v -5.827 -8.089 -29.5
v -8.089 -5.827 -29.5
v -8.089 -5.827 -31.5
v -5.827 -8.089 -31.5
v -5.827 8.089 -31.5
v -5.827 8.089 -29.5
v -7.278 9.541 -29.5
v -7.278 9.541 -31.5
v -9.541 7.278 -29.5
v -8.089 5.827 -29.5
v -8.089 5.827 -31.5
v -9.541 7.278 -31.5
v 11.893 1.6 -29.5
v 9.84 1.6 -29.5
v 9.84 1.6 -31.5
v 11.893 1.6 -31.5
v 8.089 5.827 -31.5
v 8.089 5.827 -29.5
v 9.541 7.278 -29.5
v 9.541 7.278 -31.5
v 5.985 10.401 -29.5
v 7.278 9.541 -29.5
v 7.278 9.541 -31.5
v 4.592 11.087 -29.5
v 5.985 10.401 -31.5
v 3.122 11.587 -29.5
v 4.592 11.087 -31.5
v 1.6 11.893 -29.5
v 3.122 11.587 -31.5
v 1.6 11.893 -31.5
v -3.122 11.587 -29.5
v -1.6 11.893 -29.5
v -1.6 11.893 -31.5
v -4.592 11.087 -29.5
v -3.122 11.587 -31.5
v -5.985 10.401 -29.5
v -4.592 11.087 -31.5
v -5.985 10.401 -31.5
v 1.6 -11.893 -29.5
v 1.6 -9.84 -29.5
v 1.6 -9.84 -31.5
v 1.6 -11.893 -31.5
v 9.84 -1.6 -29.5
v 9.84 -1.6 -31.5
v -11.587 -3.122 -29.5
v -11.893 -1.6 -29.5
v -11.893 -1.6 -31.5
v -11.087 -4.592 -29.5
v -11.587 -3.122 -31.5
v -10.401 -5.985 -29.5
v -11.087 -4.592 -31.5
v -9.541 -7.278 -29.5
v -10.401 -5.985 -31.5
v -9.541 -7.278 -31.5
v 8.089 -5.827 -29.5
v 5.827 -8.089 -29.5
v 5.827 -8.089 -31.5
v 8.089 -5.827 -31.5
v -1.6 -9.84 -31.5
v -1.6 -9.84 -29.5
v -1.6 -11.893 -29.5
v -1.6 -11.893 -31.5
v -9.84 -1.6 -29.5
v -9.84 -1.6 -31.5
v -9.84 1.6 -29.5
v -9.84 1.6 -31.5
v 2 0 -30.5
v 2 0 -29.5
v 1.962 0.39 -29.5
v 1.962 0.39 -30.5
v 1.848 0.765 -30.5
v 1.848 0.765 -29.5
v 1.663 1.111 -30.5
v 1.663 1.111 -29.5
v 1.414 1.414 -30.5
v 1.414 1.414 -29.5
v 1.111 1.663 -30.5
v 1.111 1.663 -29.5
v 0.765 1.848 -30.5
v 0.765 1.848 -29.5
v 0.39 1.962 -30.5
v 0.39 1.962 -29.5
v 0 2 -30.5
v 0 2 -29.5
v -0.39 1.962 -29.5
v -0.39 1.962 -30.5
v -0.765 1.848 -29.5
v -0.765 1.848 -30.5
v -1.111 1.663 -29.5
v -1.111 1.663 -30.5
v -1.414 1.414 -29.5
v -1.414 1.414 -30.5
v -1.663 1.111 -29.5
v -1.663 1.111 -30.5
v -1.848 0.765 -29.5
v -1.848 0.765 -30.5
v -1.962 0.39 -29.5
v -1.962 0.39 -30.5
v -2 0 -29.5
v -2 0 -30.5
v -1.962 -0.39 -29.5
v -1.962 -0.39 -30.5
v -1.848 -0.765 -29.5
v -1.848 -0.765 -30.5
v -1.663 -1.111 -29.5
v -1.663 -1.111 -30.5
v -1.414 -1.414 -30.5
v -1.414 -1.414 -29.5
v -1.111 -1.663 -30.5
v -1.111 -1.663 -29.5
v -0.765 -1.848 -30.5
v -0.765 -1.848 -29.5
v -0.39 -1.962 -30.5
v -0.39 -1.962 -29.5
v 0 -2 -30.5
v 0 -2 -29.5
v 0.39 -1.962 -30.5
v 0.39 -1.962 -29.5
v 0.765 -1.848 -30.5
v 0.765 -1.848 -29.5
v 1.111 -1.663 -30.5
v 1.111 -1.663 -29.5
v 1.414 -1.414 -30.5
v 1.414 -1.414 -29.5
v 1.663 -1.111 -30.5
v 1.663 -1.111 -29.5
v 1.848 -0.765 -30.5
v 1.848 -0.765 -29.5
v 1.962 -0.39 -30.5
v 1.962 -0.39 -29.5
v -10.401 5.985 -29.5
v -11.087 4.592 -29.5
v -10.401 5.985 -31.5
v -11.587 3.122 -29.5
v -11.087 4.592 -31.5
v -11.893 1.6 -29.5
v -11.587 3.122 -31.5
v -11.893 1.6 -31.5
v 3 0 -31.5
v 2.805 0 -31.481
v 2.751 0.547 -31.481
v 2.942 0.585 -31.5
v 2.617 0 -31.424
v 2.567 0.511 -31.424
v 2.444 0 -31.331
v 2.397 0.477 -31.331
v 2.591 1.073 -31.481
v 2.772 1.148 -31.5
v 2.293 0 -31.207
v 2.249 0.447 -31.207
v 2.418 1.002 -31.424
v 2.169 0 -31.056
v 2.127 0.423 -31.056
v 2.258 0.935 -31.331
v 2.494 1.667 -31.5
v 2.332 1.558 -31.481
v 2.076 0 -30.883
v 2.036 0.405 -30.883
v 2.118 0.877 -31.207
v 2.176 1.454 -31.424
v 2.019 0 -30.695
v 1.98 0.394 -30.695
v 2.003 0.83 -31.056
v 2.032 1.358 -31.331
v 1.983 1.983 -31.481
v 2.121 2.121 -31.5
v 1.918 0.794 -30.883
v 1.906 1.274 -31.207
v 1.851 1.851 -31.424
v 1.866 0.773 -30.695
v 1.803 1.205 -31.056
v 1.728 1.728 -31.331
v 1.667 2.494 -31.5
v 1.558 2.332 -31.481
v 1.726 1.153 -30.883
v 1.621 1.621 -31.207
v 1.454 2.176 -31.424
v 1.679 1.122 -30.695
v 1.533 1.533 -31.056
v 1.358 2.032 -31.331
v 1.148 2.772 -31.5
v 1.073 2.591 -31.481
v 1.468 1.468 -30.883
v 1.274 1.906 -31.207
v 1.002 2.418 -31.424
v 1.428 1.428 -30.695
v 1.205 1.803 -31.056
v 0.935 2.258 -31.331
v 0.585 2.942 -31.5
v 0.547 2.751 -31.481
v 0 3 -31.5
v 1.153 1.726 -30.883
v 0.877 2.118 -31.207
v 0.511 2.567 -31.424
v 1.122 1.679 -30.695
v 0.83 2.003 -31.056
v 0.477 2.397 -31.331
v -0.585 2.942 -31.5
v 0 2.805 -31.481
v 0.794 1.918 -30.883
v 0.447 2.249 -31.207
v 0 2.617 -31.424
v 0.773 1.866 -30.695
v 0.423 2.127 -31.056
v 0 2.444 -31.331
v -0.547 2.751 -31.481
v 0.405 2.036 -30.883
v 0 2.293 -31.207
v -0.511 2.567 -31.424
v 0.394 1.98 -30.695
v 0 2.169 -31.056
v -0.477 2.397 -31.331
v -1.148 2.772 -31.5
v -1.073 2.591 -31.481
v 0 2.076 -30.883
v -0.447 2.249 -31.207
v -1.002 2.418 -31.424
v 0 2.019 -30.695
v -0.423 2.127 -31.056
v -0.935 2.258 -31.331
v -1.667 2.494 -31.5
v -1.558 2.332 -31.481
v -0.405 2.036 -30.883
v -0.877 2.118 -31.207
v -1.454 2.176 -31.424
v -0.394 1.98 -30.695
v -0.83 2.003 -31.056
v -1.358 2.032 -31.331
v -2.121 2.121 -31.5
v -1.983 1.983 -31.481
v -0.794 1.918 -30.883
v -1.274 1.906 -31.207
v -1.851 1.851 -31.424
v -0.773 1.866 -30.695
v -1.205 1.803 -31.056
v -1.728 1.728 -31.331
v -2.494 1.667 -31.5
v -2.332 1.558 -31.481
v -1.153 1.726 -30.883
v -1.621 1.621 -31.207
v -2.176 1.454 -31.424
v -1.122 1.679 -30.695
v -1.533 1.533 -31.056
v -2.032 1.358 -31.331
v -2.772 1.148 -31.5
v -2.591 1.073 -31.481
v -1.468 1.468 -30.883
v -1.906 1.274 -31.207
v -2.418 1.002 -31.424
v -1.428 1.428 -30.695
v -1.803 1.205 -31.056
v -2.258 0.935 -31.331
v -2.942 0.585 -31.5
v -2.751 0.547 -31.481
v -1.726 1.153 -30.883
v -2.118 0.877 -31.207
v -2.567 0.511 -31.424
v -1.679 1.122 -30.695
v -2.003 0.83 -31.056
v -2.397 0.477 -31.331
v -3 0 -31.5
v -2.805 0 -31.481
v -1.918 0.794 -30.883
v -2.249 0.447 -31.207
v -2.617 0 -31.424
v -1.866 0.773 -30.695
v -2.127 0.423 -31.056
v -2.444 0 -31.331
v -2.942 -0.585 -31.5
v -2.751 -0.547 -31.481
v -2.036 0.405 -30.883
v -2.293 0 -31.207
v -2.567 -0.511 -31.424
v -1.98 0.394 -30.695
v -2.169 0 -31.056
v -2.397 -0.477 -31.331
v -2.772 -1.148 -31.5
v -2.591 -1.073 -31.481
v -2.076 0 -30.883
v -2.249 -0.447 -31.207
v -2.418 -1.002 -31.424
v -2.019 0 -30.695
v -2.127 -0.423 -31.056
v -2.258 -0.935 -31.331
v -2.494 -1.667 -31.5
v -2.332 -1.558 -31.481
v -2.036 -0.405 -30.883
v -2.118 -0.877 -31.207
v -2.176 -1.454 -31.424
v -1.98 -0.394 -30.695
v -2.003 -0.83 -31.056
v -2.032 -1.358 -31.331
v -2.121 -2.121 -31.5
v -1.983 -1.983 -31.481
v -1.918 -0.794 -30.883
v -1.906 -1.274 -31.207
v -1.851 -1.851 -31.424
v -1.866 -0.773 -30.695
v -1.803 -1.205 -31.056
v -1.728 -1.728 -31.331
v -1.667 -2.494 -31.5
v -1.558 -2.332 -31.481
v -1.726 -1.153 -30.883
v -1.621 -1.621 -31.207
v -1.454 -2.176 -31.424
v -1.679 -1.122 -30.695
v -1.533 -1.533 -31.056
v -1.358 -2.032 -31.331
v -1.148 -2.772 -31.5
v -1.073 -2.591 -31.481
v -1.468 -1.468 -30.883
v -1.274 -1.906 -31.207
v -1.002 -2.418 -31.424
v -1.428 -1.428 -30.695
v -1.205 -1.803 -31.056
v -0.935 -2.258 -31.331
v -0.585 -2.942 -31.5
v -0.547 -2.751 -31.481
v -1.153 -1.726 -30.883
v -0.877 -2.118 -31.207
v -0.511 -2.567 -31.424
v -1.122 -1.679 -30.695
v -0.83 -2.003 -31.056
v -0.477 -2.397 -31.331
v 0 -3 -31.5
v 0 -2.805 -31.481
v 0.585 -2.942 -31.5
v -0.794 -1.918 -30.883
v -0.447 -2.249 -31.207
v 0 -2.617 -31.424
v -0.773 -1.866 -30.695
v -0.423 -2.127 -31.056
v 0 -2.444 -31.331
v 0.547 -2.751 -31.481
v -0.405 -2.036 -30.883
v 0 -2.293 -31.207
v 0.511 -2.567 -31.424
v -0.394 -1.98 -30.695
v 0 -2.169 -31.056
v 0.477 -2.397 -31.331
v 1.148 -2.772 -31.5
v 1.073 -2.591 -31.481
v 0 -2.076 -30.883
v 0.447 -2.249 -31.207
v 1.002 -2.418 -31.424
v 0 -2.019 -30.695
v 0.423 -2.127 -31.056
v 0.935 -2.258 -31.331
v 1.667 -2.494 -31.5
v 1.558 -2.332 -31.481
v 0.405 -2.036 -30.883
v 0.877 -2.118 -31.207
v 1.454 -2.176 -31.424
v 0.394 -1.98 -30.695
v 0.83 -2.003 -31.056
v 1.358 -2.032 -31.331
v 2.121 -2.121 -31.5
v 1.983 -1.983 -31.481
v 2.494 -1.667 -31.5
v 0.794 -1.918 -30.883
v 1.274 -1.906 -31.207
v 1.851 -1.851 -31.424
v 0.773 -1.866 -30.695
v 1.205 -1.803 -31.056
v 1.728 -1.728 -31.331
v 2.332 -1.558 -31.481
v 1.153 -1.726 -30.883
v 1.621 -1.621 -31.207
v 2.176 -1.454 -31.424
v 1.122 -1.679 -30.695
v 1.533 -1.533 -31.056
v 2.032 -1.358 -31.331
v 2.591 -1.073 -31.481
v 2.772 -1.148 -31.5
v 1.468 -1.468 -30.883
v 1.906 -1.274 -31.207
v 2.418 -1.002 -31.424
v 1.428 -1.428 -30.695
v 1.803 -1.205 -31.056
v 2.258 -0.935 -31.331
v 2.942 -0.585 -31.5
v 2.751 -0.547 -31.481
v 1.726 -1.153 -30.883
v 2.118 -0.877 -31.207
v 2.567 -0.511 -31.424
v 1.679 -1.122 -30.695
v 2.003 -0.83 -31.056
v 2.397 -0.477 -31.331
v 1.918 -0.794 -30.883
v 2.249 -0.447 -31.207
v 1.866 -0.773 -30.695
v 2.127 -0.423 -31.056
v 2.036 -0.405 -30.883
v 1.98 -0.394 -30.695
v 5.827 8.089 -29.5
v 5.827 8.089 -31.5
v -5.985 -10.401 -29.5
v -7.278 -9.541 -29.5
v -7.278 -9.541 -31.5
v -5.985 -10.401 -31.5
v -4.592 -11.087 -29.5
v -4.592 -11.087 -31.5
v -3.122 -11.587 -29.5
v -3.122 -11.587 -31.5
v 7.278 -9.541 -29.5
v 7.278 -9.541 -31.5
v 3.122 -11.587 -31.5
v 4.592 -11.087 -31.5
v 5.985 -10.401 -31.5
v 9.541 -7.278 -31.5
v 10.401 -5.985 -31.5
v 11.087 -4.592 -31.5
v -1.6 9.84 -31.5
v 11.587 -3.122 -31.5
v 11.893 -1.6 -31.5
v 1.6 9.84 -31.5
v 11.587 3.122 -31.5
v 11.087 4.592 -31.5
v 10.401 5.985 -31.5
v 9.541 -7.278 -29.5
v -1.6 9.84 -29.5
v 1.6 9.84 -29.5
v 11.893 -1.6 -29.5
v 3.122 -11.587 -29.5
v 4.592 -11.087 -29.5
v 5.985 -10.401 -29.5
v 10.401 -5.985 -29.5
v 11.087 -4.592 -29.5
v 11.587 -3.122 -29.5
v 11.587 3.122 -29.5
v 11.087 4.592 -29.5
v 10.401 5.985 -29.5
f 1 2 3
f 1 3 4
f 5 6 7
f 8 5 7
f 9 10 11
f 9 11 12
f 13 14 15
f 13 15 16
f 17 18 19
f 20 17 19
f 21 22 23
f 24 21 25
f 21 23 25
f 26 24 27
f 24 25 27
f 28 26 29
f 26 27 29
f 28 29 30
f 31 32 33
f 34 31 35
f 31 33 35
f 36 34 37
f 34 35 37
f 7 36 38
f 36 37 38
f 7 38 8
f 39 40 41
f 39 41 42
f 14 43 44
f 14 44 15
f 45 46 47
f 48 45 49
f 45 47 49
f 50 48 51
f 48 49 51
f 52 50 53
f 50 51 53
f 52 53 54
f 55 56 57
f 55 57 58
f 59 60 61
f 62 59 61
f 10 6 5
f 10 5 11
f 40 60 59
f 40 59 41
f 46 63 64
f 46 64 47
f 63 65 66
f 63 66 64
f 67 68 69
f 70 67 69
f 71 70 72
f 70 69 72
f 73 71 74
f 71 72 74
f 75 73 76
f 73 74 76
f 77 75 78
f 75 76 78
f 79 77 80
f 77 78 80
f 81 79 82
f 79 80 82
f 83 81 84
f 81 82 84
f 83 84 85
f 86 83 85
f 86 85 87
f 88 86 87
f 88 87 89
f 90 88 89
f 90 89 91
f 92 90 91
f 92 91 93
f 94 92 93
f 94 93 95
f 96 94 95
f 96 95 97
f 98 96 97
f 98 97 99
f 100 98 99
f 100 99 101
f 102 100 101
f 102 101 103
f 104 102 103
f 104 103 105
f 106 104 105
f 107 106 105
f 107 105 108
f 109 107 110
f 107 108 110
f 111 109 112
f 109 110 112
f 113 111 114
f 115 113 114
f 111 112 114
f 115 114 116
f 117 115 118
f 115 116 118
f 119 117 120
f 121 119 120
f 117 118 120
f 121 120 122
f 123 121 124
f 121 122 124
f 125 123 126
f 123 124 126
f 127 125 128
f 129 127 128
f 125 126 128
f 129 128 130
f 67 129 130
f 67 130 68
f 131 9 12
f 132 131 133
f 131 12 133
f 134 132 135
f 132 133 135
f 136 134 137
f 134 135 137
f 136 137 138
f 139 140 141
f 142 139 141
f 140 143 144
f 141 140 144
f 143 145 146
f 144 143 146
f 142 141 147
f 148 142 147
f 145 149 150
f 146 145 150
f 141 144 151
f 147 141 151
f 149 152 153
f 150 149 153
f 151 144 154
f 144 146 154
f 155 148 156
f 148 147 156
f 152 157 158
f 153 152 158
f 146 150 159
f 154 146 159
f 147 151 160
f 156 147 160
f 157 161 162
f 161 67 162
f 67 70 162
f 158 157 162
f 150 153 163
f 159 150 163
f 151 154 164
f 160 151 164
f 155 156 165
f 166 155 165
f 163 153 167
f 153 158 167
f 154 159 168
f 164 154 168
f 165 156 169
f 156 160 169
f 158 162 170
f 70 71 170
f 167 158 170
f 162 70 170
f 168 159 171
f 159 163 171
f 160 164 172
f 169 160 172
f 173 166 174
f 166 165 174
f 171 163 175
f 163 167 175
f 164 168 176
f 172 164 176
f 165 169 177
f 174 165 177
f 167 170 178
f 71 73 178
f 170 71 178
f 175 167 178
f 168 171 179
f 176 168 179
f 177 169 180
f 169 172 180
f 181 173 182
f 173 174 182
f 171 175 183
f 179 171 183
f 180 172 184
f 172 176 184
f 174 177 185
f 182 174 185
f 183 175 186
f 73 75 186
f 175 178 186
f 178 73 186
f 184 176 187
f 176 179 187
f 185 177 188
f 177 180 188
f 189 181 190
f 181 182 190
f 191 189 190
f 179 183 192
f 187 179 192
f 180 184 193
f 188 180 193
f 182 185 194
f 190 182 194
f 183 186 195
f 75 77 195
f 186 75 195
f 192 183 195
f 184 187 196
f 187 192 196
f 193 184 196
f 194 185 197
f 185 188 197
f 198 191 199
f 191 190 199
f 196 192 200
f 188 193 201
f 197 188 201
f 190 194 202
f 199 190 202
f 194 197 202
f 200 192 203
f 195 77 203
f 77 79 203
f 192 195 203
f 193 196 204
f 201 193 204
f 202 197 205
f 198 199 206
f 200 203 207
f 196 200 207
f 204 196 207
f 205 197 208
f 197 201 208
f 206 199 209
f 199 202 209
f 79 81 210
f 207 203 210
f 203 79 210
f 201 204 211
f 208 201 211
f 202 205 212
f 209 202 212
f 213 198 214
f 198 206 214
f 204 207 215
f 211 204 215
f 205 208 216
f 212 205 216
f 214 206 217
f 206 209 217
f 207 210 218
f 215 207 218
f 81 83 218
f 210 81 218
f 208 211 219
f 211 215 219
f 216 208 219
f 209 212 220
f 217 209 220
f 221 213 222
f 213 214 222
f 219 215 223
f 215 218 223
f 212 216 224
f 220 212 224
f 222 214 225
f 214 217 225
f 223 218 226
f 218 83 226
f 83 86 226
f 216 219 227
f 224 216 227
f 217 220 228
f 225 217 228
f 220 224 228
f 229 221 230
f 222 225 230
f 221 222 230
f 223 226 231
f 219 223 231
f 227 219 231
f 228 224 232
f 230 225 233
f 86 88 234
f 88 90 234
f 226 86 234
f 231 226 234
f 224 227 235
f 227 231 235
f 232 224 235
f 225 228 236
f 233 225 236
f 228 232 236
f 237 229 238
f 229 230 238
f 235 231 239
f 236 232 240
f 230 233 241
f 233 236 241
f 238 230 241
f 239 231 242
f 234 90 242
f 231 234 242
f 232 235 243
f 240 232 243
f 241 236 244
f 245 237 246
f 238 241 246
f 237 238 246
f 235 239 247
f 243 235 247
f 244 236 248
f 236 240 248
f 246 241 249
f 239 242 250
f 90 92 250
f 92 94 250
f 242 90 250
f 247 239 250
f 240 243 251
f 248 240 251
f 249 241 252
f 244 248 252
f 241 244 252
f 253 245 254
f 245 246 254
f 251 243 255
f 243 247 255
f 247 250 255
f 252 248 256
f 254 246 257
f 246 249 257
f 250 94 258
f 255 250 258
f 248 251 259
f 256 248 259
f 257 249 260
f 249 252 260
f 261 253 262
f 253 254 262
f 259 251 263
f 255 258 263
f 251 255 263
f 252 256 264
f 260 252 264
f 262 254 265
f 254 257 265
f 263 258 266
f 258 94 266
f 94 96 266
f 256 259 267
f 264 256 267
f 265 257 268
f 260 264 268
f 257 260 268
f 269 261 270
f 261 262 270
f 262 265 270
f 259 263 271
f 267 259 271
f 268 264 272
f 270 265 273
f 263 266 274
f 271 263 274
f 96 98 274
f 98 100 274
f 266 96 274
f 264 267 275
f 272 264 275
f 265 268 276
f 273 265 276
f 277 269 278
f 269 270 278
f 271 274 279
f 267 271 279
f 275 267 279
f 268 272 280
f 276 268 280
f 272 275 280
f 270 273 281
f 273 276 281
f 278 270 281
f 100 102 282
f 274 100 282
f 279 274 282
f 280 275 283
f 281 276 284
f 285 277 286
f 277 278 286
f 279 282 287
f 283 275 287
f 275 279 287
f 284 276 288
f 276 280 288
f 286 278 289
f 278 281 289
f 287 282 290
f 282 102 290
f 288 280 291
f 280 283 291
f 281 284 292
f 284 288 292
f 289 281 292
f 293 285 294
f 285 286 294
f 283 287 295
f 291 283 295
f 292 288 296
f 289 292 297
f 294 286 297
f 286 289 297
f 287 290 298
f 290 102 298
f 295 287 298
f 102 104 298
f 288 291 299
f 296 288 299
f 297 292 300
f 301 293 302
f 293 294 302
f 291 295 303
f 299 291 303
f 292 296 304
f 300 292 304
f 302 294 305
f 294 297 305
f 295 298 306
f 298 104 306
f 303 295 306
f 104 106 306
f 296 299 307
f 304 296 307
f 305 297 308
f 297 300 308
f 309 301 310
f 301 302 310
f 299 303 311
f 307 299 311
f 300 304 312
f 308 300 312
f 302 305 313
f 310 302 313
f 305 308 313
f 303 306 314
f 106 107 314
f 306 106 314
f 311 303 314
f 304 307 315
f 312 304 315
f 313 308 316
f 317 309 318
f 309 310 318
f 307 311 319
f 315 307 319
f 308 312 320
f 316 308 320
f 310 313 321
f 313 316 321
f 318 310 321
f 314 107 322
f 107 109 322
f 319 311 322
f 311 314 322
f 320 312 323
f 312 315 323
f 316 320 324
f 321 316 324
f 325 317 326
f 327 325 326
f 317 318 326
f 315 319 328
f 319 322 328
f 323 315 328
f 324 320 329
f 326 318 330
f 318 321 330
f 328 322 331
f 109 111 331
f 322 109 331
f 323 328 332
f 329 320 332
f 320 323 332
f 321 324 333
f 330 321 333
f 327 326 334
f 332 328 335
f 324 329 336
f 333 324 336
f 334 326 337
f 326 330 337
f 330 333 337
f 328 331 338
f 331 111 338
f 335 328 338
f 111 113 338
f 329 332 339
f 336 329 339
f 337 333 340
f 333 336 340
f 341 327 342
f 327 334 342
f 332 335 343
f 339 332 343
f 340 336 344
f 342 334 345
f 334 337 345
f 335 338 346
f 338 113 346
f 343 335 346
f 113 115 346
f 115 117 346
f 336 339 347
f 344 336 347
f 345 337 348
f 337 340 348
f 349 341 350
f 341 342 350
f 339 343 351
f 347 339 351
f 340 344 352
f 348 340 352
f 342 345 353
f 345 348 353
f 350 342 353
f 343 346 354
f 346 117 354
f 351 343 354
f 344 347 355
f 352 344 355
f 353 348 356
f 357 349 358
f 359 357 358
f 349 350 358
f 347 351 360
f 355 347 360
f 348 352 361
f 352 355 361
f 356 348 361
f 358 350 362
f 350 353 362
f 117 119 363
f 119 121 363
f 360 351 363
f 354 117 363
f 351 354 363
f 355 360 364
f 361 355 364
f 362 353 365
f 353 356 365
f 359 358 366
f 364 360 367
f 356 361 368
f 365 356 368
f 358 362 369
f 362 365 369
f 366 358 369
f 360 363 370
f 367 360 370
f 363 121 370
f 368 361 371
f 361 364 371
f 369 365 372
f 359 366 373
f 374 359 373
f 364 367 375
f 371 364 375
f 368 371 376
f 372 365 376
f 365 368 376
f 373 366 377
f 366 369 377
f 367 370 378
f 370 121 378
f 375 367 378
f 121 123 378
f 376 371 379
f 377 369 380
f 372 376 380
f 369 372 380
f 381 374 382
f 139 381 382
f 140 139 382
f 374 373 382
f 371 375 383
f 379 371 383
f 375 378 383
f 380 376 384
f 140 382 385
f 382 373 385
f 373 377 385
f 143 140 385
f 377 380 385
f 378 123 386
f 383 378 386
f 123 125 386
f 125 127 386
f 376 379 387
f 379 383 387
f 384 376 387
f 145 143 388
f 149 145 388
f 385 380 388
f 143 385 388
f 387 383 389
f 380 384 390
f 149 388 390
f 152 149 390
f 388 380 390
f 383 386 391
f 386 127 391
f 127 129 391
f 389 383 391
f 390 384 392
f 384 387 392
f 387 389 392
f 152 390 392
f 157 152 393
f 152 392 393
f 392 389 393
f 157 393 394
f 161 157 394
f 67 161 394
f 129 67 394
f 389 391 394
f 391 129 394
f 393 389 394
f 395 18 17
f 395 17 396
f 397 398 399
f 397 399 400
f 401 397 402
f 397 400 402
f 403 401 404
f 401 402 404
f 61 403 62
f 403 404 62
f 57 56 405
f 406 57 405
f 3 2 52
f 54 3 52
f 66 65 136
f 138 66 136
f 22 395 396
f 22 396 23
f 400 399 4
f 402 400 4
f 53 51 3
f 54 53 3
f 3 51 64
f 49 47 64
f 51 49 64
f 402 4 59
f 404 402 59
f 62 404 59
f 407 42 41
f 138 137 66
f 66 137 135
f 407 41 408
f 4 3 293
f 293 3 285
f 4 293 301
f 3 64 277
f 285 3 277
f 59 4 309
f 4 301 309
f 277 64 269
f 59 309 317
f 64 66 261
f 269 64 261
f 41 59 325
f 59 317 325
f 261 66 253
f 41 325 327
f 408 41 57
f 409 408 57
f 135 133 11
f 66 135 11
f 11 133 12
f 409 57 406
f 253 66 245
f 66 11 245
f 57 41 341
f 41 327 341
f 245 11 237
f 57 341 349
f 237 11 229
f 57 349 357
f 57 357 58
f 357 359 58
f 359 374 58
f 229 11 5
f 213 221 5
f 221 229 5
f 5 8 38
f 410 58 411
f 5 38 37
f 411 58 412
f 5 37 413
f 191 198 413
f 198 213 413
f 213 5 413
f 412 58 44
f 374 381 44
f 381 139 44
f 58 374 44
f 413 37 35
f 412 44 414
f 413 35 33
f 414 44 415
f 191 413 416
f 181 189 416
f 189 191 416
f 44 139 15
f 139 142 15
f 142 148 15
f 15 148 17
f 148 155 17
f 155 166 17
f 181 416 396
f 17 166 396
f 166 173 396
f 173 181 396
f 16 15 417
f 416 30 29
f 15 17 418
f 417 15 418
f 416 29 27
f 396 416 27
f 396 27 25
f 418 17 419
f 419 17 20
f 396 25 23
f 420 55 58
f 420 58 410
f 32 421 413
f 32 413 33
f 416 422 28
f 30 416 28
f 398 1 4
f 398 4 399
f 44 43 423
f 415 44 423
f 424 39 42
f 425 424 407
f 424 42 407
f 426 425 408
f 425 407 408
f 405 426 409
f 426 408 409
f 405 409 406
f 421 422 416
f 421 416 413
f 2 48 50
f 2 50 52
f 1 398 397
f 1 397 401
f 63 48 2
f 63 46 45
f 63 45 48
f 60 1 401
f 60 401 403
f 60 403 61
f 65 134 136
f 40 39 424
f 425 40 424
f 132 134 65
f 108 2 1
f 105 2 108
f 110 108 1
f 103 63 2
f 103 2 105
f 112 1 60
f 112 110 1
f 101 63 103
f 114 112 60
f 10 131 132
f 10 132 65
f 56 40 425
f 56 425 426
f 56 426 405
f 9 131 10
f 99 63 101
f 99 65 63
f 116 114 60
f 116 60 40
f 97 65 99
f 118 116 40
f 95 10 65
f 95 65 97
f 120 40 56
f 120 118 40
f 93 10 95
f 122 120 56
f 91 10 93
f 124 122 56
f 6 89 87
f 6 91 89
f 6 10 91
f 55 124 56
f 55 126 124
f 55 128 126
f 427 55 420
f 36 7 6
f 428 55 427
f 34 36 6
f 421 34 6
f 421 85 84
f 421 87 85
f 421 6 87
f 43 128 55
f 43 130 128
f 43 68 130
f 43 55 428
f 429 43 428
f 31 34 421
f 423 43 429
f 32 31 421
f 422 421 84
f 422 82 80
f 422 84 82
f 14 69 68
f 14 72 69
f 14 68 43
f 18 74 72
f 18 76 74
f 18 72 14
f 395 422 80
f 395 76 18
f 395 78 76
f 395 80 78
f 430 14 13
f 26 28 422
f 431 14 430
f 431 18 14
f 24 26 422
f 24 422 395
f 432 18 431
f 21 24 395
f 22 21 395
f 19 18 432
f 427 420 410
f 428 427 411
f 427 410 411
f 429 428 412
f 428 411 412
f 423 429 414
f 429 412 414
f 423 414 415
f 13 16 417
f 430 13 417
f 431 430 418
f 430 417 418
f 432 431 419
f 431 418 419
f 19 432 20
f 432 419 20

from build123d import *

# Parameters (mm, degrees)
SKETCH005_R           = 12
PAD002_DEPTH          = 2
SKETCH004_W           = 2.57
SKETCH004_H           = 3.2
POCKET003_DEPTH       = 5
POLARPATTERN001_COUNT = 8
SKETCH006_R           = 2
POCKET002_DEPTH       = 6
FILLET001_R           = 1


with BuildPart() as part:
    # Sketch005 → Pad002 (new body)
    with BuildSketch(Plane.XY.offset(28.5)):
        Circle(SKETCH005_R)
    extrude(amount=PAD002_DEPTH)

    # Sketch004 (on Face3 of Pad002) → Pocket003 (cut)
    with BuildSketch(Plane.XY.offset(30.5)):
        with Locations((11.125, 0)):
            Rectangle(SKETCH004_W, SKETCH004_H)
    pocket003 = extrude(amount=-POCKET003_DEPTH, mode=Mode.SUBTRACT)

    # PolarPattern001: Pocket003 ×8 about axis
    polarpattern001_axis = Axis((0, 0, 30.5), (0, 0, 1))
    for i in range(1, POLARPATTERN001_COUNT):
        add(pocket003.rotate(polarpattern001_axis, i * 360 / POLARPATTERN001_COUNT), mode=Mode.SUBTRACT)

    # Sketch006 (on Face4 of PolarPattern001) → Pocket002 (cut)
    with BuildSketch(Plane.XY.offset(30.5)):
        Circle(SKETCH006_R)
    extrude(amount=-POCKET002_DEPTH, mode=Mode.SUBTRACT)

    # Fillet001
    fillet001_edges = [part.edges().sort_by_distance(p)[0] for p in [
        (-2, 0, 28.5),
    ]]
    fillet(fillet001_edges, radius=FILLET001_R)


with BuildPart() as part_1:
    # Body002 placement: moved
    add(part.part.moved(Location((0, 0, -60))))


solid = part_1.part
